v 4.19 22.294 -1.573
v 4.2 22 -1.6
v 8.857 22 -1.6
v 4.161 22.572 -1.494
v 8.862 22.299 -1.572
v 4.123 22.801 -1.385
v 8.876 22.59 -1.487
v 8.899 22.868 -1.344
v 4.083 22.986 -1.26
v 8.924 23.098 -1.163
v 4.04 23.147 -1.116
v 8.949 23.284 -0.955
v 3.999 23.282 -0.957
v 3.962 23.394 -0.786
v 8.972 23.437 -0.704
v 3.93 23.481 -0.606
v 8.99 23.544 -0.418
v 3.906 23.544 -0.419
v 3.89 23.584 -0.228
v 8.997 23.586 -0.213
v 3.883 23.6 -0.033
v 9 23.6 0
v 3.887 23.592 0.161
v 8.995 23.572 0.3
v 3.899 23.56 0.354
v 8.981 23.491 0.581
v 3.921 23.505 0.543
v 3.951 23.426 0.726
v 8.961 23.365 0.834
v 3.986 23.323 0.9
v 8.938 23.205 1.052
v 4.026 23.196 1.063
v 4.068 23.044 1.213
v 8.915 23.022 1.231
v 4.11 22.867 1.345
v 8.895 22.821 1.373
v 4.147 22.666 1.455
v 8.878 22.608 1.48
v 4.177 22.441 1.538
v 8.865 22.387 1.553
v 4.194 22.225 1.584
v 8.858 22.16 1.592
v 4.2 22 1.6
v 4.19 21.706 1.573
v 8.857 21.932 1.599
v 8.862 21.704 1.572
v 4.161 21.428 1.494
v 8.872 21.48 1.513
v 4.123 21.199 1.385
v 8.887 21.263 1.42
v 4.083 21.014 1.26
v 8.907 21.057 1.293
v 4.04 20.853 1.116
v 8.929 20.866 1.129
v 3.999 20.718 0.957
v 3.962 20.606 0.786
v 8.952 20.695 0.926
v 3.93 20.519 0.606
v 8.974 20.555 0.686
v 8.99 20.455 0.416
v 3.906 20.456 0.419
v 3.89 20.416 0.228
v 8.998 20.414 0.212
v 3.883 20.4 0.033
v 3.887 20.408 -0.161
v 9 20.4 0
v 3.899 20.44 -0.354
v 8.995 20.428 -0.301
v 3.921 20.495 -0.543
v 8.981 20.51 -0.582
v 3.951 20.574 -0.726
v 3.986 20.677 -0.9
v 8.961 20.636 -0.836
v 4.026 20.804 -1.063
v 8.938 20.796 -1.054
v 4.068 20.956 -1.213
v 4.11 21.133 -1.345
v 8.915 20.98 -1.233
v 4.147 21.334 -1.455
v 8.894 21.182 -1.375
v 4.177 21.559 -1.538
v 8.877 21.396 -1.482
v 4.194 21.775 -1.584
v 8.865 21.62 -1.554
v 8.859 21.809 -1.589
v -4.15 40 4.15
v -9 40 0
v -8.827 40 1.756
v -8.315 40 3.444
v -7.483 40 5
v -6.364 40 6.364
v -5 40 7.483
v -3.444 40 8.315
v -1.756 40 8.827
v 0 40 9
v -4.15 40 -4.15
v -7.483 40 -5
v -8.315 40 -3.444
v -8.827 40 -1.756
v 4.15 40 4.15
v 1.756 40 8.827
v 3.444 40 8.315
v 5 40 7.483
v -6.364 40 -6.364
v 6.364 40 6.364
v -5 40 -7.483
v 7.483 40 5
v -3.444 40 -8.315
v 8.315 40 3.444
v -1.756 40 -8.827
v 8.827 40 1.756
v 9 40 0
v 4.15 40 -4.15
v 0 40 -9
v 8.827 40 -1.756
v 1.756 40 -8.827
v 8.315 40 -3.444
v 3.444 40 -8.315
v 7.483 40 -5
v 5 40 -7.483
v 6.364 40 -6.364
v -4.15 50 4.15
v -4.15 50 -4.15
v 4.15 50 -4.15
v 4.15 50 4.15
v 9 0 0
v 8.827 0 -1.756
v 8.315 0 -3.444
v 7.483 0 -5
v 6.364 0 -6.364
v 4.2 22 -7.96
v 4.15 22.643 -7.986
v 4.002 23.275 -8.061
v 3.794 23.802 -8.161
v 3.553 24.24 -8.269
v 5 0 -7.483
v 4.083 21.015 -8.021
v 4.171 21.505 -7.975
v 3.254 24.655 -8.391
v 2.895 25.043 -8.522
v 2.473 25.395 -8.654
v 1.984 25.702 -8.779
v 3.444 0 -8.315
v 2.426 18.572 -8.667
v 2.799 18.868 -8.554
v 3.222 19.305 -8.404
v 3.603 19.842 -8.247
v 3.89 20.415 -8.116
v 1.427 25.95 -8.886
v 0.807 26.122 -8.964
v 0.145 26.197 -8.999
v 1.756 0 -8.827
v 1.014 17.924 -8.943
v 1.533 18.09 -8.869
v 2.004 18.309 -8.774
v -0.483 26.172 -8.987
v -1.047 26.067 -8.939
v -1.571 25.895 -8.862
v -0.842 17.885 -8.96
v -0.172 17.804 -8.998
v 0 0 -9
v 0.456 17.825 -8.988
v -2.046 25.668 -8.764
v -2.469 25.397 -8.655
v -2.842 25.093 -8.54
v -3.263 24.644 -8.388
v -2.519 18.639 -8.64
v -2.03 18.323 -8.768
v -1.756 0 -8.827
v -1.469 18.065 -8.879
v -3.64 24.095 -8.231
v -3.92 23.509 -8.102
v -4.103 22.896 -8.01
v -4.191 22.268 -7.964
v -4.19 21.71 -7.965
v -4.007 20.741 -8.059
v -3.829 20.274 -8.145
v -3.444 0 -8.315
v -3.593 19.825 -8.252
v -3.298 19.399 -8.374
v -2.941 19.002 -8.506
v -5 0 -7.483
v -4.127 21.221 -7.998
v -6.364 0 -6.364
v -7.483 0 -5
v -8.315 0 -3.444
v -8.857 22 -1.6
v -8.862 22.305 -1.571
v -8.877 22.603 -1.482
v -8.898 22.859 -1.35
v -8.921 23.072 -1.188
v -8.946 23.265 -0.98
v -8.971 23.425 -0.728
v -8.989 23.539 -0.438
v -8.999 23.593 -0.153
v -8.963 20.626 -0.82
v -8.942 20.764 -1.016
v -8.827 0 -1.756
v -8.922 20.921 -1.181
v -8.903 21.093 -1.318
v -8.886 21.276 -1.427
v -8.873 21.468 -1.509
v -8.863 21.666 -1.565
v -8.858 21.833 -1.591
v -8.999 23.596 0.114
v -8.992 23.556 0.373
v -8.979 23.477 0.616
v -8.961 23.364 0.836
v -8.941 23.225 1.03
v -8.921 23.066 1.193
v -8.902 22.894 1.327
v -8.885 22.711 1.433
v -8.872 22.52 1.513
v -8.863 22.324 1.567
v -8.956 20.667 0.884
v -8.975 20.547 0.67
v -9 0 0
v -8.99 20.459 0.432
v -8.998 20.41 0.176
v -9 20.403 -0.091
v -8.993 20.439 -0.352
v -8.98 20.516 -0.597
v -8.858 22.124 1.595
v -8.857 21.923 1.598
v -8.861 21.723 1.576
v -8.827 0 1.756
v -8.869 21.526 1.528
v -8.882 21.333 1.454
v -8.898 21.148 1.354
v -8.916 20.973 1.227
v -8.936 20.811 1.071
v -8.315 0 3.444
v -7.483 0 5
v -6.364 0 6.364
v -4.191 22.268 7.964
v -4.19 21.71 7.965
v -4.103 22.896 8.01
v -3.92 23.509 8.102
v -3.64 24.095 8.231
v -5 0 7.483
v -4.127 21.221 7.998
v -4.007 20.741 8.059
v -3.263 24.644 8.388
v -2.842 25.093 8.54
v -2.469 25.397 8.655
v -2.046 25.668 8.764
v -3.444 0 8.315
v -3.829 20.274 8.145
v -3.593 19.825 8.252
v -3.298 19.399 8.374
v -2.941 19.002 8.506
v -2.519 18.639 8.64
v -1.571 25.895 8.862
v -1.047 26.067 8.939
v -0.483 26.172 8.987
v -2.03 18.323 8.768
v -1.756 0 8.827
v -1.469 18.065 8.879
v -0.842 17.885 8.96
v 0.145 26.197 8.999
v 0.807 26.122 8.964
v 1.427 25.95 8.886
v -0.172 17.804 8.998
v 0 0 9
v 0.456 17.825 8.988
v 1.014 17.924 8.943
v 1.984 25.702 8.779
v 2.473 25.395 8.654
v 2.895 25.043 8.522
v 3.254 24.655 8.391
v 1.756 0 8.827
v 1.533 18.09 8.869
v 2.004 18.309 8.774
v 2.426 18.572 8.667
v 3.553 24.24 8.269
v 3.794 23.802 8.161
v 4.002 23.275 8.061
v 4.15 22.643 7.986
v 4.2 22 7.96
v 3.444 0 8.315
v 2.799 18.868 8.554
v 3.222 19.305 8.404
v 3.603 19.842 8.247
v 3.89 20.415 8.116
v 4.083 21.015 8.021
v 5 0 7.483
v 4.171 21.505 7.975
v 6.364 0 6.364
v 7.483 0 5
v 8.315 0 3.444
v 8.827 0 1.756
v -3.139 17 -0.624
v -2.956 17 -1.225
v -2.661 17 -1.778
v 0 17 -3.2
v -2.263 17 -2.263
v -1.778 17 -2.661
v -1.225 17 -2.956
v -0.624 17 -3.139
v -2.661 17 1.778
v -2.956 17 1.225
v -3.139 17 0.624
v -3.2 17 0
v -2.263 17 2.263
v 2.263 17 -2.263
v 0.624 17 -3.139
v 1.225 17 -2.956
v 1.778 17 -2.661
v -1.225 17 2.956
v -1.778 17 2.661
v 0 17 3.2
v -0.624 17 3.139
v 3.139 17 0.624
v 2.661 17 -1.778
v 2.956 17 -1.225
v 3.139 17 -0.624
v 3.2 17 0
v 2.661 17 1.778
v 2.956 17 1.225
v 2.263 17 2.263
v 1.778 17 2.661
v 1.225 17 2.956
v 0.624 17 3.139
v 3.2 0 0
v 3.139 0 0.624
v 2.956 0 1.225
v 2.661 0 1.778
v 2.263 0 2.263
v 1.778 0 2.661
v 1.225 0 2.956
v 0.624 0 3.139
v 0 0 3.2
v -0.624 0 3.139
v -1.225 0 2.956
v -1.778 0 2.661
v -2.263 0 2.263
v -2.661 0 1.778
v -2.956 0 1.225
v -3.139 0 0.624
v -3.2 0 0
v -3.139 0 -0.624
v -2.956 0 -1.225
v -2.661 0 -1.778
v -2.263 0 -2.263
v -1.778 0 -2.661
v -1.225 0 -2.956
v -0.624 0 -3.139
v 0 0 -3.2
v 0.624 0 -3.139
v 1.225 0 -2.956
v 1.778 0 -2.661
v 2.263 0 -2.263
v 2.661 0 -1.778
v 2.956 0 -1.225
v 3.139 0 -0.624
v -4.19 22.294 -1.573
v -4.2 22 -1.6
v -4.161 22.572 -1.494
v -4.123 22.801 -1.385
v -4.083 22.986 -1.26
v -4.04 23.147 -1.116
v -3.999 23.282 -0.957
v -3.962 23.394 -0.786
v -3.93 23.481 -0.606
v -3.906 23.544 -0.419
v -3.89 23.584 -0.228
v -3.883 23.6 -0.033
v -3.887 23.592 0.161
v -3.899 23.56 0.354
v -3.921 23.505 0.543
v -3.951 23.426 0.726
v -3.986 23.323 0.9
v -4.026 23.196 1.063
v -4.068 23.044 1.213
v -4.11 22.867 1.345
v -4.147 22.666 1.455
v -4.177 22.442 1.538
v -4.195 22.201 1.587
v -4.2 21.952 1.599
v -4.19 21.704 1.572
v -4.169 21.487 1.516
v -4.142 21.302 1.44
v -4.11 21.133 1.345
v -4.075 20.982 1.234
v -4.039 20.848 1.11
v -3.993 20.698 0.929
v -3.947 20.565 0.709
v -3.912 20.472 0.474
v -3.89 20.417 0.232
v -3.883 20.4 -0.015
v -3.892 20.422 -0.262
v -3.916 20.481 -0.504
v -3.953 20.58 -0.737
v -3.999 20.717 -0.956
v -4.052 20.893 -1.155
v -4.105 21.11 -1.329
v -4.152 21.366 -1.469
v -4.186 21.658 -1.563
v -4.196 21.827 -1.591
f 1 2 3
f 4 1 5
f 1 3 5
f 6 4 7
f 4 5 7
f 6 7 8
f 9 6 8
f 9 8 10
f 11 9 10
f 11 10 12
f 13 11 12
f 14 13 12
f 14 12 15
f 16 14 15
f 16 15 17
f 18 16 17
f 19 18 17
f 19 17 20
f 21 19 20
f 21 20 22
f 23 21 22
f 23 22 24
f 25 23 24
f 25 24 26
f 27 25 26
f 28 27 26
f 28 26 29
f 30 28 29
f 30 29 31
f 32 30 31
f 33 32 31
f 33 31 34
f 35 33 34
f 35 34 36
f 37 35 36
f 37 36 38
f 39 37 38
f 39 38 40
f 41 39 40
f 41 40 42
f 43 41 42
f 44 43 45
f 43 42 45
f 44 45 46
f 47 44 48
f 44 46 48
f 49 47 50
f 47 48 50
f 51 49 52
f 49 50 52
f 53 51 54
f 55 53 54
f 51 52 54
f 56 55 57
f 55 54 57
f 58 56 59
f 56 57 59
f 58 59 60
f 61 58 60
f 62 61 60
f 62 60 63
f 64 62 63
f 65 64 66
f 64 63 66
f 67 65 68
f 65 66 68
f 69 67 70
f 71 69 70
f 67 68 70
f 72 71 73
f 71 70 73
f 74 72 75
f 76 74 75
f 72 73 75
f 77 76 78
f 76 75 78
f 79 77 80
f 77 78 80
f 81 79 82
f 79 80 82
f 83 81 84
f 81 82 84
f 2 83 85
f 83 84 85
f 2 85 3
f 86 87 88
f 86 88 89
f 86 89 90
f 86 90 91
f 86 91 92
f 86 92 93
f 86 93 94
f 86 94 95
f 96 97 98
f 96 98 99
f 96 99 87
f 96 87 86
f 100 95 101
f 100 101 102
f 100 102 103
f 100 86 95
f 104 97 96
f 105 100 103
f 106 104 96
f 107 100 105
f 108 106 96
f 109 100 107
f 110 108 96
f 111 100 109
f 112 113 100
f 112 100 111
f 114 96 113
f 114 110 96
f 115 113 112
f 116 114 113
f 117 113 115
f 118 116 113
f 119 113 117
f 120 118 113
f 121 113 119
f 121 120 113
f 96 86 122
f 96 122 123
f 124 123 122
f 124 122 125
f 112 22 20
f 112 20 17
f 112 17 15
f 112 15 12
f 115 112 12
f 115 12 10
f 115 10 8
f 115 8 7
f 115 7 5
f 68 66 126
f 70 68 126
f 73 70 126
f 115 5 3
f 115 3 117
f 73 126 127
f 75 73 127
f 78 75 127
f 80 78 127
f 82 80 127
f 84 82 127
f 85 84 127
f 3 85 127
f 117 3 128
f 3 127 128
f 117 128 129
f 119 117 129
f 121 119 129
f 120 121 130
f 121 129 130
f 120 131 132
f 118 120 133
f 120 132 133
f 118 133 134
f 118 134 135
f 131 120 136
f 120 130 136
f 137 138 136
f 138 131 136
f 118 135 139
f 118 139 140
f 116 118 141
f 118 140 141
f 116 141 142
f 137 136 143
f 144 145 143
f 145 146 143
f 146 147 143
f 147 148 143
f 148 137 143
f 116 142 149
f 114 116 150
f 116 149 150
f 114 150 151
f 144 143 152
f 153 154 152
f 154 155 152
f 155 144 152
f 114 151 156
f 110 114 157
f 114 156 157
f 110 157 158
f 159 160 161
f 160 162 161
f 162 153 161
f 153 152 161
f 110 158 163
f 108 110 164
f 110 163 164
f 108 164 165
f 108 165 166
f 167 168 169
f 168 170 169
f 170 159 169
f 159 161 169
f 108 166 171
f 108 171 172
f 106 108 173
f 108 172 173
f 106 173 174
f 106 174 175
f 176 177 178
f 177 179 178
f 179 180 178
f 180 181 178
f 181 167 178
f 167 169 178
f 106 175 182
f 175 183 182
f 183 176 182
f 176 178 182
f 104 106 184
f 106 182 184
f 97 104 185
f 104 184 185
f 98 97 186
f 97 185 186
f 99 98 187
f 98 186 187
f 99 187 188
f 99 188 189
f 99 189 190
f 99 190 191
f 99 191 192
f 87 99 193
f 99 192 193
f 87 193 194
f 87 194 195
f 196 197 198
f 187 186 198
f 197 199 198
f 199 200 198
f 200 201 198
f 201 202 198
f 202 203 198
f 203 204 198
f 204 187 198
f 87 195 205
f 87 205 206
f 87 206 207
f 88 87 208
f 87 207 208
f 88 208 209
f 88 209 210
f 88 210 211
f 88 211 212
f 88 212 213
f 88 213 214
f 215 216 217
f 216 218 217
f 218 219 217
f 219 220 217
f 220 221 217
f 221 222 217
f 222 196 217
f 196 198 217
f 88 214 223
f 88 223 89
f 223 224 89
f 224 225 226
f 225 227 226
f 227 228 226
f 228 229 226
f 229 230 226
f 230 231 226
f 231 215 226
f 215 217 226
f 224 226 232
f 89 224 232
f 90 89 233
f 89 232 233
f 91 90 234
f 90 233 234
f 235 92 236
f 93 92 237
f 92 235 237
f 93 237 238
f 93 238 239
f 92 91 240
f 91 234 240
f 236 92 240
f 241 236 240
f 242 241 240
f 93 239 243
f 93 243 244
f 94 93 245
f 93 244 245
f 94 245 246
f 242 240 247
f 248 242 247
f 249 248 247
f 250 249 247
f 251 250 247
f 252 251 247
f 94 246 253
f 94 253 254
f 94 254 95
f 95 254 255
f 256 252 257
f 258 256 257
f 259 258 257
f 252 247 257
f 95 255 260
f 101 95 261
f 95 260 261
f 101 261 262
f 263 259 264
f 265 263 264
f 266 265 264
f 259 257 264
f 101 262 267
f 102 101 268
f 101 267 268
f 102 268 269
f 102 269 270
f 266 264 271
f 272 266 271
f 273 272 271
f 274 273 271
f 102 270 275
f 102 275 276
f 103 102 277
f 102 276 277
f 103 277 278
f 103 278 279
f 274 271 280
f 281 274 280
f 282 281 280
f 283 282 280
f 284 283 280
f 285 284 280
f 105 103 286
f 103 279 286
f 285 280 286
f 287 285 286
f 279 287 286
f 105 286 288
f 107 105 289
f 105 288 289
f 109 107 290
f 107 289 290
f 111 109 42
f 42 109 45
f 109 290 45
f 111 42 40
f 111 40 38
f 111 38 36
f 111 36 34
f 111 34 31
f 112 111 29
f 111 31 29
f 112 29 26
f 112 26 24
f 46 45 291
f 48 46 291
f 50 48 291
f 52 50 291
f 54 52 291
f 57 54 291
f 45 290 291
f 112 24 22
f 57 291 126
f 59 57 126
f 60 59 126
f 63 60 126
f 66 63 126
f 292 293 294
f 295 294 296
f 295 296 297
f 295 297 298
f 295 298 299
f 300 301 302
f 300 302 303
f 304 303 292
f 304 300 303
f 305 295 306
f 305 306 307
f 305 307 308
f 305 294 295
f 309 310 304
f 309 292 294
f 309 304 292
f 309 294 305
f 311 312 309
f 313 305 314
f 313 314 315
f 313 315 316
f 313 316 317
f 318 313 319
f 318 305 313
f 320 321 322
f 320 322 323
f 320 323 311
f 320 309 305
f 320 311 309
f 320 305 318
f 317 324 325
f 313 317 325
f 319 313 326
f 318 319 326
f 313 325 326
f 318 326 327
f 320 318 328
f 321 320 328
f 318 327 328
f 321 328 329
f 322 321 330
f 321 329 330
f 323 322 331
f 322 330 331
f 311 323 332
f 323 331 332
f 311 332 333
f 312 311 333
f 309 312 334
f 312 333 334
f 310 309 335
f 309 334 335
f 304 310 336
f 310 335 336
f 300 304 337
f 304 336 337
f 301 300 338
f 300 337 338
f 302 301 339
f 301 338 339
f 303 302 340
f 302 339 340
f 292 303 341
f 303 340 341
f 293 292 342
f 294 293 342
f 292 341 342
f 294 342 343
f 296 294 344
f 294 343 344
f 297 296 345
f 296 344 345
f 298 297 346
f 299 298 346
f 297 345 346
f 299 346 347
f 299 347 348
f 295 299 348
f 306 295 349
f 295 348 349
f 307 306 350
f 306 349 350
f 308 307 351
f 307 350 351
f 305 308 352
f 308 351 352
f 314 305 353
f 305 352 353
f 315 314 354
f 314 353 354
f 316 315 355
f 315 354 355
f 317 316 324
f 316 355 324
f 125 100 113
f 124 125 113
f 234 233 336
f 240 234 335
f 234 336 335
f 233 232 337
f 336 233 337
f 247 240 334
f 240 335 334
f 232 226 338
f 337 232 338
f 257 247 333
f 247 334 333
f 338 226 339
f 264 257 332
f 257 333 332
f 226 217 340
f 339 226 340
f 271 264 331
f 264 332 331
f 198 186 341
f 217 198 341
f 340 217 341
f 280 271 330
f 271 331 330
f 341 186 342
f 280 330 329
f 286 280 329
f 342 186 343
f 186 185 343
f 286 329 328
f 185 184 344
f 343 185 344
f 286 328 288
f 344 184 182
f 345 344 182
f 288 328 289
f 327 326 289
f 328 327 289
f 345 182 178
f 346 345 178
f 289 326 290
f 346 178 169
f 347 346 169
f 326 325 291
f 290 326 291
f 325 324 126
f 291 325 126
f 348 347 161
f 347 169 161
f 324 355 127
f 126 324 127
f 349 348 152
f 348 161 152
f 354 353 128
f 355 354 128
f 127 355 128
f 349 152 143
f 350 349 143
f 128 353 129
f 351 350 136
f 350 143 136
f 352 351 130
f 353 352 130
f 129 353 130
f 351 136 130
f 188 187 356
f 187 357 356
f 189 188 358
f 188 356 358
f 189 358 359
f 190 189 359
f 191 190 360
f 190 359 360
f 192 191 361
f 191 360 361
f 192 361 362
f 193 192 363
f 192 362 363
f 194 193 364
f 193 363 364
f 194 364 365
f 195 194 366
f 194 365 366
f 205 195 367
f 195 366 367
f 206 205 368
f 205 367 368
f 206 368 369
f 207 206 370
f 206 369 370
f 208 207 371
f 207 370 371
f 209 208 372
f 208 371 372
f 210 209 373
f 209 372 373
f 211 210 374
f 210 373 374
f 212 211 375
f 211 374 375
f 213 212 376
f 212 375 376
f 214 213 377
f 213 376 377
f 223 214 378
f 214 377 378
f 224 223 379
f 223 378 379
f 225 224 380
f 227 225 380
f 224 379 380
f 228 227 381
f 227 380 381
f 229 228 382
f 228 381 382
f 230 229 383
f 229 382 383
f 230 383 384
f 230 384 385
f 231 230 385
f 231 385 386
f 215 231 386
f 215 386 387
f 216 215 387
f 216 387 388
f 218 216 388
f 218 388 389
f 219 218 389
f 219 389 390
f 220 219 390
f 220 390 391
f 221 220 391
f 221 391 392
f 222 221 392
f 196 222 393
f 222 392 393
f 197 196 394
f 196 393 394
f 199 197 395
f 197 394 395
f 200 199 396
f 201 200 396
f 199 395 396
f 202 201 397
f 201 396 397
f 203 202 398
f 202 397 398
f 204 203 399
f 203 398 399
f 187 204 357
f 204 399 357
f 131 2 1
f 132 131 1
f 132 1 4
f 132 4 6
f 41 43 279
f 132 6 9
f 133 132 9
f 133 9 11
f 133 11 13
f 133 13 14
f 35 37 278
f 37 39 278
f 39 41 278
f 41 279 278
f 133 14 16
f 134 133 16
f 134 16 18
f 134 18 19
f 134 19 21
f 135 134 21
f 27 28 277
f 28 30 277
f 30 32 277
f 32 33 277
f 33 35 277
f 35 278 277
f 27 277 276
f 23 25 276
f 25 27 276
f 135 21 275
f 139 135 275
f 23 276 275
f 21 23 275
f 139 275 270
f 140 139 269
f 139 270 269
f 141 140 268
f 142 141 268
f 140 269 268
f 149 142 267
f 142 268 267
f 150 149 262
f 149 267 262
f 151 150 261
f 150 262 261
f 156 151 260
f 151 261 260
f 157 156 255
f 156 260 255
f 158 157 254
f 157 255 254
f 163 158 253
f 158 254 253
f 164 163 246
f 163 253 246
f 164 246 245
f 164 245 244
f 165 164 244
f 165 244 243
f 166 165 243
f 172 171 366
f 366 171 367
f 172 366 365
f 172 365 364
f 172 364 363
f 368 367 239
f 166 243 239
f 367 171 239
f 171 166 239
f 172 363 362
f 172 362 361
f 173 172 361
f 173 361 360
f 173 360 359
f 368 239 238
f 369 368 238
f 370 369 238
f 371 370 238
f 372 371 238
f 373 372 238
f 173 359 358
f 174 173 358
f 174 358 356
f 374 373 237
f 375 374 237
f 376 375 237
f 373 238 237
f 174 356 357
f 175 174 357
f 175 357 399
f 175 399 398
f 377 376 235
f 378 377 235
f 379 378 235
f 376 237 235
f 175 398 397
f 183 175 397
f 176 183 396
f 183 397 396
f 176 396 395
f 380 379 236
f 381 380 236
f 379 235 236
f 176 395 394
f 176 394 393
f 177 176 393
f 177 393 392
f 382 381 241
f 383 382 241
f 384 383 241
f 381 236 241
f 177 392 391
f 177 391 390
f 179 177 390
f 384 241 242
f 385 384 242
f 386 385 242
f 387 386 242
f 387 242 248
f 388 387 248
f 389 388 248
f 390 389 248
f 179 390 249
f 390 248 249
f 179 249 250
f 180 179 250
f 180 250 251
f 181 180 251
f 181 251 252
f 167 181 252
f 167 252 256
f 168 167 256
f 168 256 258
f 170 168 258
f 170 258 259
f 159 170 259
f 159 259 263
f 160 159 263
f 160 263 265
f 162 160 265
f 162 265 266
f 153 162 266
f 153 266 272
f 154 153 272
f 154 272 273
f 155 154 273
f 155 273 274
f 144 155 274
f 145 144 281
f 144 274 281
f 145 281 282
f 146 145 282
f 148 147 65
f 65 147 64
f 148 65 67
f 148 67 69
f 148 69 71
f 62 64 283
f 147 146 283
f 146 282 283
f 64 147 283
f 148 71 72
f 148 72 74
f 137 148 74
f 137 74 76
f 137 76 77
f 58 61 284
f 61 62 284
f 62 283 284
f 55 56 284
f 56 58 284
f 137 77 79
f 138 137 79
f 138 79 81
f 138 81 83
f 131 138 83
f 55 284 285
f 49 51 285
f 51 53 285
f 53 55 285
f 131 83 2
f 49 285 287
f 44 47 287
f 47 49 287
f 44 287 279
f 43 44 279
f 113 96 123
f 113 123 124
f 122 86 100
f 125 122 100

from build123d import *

# Parameters (mm, degrees)
SKETCH_1_R          = 9
EXTRUDE_1_DEPTH     = 40
SKETCH_2_R          = 3.2
CUT_EXTRUDE_1_DEPTH = 17
SKETCH_15_W         = 8.3
SKETCH_15_H         = 8.3
EXTRUDE_2_DEPTH     = 10
SKETCH_16_R         = 4.2
CUT_EXTRUDE_2_DEPTH = 10
SKETCH_17_R         = 1.6
CUT_EXTRUDE_3_DEPTH = 10


with BuildPart() as part:
    # 草图1 → 凸台-拉伸1 (new body)
    with BuildSketch(Plane(origin=(0, 0, 0), x_dir=(1, 0, 0), z_dir=(0, 1, 0))):
        Circle(SKETCH_1_R)
    extrude(amount=EXTRUDE_1_DEPTH)

    # 草图2 → 切除-拉伸1 (cut)
    with BuildSketch(Plane.XZ):
        Circle(SKETCH_2_R)
    extrude(amount=-CUT_EXTRUDE_1_DEPTH, mode=Mode.SUBTRACT)

    # 草图15 → 凸台-拉伸2 (add)
    with BuildSketch(Plane(origin=(0, 40, 0), x_dir=(1, 0, 0), z_dir=(0, 1, 0))):
        Rectangle(SKETCH_15_W, SKETCH_15_H)
    extrude(amount=EXTRUDE_2_DEPTH)

    # 草图16 → 切除-拉伸2 (cut, symmetric)
    with BuildSketch(Plane.XY):
        with Locations((0, 22)):
            Circle(SKETCH_16_R)
    extrude(amount=CUT_EXTRUDE_2_DEPTH, both=True, mode=Mode.SUBTRACT)

    # 草图17 → 切除-拉伸3 (cut, symmetric)
    with BuildSketch(Plane(origin=(0, 0, 0), x_dir=(0, 0, -1), z_dir=(1, 0, 0))):
        with Locations((0, 22)):
            Circle(SKETCH_17_R)
    extrude(amount=CUT_EXTRUDE_3_DEPTH, both=True, mode=Mode.SUBTRACT)


solid = part.part
